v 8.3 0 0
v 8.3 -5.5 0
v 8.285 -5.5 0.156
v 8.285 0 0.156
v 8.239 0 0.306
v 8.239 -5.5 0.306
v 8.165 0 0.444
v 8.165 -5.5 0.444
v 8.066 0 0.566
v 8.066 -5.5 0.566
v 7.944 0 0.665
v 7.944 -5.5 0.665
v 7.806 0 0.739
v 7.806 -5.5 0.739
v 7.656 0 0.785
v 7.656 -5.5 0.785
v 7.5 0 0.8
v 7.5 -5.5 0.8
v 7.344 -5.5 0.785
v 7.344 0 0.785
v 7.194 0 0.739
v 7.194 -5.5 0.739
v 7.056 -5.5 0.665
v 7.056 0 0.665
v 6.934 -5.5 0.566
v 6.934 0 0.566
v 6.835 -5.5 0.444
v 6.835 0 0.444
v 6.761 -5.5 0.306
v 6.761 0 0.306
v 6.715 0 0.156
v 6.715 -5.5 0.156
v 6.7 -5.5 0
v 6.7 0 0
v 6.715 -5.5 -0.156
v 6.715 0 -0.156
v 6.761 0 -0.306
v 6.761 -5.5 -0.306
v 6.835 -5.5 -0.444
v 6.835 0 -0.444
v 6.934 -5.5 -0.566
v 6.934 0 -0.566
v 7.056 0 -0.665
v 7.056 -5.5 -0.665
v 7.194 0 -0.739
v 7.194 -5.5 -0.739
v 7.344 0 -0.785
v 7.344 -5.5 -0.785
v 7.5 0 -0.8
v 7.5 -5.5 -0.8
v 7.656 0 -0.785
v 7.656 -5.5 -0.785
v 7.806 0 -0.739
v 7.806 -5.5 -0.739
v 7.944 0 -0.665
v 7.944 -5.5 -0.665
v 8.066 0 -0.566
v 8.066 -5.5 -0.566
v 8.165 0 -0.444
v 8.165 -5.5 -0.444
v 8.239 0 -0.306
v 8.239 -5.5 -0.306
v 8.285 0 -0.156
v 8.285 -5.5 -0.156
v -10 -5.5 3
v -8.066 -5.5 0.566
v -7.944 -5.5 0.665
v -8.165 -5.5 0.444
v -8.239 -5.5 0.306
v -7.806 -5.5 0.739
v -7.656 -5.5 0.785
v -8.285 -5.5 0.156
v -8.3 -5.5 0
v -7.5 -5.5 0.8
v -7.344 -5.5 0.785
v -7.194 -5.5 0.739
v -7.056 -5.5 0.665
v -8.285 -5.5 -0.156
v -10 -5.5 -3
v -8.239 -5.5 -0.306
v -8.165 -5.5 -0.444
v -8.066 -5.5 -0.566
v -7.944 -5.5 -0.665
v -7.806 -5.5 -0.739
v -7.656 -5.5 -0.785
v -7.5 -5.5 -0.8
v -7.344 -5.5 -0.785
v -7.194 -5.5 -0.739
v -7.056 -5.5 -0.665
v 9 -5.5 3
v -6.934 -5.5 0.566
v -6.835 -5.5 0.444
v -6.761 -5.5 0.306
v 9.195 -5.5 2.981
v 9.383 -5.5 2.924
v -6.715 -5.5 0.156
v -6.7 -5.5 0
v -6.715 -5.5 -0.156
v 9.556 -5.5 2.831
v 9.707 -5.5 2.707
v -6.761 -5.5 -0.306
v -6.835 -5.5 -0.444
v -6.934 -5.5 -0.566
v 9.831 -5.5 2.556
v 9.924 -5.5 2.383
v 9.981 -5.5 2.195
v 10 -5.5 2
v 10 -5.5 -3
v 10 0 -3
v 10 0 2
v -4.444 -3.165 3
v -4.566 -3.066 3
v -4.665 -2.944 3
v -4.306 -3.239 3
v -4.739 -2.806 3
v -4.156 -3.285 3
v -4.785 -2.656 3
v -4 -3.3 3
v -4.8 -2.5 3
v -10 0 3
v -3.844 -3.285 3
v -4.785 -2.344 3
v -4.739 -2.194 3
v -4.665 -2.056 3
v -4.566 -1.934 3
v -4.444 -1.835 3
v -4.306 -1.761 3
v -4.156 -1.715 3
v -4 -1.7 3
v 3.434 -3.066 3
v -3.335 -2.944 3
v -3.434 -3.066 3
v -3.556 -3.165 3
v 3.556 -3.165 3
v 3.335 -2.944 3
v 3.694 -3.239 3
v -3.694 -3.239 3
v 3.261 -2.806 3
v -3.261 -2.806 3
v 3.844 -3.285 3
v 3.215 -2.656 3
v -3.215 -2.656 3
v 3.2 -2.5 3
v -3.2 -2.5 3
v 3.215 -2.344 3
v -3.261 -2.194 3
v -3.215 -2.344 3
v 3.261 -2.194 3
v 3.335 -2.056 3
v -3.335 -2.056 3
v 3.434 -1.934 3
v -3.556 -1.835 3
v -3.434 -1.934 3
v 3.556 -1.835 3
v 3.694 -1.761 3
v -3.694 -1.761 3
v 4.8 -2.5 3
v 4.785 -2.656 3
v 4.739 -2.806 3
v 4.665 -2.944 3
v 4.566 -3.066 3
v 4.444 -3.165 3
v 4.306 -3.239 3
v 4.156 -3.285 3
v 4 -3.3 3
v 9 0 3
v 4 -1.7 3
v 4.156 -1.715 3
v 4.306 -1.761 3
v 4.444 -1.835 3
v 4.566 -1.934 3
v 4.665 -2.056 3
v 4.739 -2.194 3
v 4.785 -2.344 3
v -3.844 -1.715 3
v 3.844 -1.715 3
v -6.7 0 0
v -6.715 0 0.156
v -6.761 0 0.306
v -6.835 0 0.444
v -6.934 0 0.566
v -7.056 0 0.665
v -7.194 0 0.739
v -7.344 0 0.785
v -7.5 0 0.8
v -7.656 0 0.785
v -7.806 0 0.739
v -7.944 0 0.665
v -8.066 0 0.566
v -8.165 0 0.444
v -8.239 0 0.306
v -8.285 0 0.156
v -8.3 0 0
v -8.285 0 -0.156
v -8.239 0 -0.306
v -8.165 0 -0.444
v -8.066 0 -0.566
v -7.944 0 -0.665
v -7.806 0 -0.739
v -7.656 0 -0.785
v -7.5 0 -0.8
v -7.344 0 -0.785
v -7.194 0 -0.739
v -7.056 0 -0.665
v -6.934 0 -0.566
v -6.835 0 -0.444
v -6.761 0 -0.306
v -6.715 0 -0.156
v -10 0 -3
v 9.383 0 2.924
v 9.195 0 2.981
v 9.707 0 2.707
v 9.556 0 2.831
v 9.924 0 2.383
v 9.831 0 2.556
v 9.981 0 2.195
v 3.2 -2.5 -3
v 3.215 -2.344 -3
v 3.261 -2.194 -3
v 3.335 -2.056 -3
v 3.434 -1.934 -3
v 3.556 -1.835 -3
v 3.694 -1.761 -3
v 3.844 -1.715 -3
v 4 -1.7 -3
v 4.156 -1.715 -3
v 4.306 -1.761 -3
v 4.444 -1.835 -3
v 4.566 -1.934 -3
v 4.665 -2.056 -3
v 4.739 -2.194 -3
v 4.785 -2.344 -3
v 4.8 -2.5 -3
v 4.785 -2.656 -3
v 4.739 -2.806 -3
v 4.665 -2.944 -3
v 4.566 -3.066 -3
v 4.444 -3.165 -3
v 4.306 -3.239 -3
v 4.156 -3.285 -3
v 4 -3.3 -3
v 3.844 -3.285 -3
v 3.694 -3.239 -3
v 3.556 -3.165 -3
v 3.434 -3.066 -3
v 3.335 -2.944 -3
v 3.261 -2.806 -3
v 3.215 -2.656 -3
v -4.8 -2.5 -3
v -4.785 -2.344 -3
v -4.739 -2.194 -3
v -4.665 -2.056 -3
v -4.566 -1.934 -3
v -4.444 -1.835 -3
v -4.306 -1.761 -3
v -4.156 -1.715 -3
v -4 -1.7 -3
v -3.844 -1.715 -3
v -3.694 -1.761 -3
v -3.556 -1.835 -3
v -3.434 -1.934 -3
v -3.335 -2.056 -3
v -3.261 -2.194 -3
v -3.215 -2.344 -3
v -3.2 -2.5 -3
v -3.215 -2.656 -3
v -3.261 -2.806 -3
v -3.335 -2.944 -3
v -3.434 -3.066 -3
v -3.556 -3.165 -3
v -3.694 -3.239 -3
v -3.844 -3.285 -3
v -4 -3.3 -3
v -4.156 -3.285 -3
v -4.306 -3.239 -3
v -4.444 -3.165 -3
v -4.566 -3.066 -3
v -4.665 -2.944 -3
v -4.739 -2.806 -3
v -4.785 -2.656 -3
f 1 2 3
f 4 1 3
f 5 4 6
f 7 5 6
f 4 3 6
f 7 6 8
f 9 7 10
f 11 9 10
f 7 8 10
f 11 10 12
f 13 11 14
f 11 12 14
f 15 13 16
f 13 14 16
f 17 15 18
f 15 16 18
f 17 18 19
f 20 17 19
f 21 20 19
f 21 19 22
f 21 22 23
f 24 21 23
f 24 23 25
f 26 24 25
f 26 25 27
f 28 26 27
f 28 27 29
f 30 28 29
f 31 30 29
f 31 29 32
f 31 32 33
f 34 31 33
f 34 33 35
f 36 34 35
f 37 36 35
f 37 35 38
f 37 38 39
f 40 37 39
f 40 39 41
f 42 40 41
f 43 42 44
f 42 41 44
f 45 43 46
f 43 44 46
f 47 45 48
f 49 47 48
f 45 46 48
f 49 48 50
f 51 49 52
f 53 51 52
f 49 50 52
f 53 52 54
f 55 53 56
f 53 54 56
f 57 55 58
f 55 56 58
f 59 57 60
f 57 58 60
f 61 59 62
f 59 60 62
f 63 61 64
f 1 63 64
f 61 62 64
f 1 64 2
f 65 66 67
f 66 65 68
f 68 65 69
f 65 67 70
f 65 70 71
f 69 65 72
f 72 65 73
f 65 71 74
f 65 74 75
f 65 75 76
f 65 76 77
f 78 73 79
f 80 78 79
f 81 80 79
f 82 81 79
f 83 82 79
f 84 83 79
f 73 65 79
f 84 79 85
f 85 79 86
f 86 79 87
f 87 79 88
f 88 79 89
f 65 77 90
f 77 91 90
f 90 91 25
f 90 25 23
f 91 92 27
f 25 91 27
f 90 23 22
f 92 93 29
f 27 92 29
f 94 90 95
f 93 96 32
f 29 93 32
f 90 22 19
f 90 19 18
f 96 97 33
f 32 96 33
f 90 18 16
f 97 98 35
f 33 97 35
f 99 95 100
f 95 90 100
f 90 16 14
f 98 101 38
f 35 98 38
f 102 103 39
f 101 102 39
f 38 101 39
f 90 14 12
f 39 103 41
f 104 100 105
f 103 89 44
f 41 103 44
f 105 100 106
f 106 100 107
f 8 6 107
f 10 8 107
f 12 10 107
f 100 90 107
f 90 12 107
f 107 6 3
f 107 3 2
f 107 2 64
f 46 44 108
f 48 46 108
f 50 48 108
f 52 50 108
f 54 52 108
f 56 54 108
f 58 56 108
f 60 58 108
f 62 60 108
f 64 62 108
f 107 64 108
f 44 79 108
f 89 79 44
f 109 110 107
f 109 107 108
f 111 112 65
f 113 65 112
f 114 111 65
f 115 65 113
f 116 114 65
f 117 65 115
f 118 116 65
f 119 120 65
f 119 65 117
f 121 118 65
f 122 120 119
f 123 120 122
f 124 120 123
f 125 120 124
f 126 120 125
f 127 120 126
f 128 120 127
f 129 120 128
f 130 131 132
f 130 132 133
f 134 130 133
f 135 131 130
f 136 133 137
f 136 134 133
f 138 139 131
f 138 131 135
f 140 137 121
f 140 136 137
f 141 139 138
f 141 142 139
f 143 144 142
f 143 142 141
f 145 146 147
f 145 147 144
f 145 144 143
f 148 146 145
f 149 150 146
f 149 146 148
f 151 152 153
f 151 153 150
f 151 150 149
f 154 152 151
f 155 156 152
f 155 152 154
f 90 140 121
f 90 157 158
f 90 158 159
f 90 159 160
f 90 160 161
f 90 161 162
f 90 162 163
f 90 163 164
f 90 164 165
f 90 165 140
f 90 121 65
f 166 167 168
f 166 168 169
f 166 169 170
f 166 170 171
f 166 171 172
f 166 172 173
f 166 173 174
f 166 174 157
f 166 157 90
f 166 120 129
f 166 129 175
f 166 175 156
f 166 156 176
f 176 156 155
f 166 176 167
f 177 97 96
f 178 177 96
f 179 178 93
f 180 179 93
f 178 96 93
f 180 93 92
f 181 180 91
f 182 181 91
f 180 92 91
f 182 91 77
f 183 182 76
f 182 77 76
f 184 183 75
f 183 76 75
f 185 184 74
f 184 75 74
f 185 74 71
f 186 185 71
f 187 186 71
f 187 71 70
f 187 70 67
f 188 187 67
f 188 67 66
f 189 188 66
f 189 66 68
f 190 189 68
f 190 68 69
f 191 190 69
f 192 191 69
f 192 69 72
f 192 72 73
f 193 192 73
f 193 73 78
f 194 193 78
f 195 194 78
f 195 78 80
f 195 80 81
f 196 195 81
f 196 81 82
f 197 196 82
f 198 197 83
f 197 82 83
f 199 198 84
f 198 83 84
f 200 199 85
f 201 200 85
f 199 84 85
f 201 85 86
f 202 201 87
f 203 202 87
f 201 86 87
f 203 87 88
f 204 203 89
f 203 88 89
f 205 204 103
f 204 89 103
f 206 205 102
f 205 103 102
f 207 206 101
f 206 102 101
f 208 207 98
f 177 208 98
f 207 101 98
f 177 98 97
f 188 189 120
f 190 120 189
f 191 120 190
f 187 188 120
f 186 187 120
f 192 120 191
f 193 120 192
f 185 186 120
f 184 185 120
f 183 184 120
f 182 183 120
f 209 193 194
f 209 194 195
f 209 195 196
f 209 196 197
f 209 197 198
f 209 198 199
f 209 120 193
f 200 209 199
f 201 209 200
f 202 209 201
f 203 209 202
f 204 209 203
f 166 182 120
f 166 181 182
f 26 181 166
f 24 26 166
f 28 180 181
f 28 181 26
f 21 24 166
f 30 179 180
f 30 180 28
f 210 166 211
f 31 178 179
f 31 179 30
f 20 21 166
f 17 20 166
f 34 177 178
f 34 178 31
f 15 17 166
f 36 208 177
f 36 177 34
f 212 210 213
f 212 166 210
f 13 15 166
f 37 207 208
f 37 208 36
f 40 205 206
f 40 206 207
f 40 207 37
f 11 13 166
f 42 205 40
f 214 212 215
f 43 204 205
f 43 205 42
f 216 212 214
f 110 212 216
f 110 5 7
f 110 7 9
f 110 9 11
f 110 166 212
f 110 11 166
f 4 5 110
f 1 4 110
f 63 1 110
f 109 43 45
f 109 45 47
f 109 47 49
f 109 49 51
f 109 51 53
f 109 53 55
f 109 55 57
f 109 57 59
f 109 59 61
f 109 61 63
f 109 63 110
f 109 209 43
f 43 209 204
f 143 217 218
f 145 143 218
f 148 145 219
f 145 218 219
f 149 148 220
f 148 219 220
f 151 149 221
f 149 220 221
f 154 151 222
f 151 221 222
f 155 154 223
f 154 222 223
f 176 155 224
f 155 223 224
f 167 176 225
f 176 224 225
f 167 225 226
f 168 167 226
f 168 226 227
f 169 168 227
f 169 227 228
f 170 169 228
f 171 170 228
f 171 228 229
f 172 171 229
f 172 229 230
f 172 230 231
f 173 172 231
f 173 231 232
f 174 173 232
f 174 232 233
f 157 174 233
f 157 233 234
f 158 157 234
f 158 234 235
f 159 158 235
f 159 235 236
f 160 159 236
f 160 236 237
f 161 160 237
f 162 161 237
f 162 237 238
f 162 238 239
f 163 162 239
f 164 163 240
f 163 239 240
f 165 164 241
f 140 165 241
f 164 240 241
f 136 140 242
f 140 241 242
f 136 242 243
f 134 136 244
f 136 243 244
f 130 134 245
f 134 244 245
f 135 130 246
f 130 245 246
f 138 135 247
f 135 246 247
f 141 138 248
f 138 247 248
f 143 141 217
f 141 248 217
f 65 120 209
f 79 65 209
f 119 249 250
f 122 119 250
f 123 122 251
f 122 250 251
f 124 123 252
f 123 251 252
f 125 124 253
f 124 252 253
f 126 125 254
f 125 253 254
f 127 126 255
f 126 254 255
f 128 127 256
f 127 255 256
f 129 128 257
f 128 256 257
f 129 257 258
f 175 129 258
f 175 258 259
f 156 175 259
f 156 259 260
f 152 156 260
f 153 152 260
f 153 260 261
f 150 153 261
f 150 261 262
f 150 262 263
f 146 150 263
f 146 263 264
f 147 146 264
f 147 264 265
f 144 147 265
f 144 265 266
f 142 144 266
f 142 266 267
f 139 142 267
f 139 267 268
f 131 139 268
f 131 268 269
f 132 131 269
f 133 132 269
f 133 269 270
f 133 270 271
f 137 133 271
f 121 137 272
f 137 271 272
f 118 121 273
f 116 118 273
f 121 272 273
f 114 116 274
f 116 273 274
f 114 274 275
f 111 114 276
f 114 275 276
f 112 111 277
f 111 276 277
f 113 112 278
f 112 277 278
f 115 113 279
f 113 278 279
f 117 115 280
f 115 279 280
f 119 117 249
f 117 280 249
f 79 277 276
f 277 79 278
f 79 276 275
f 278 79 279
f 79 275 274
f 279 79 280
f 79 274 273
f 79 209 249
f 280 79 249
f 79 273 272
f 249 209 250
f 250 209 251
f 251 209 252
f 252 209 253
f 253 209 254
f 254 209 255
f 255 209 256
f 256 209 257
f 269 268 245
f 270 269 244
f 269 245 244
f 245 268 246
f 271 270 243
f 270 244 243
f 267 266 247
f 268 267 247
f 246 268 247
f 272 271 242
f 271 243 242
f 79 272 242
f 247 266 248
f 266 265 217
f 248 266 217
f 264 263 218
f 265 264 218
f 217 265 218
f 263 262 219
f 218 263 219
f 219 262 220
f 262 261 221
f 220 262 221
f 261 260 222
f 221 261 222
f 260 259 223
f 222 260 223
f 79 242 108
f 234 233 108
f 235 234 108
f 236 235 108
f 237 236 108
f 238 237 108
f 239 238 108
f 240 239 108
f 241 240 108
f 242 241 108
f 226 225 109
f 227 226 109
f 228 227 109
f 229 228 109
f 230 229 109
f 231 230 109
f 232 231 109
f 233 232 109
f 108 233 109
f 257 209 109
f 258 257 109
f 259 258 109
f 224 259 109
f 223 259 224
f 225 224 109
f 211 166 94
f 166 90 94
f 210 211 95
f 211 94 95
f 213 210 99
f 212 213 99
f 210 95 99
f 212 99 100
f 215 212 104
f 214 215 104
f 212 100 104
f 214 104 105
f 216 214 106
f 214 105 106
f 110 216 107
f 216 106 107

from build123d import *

# Parameters (mm, degrees)
SKETCH1_W             = 20
SKETCH1_H             = 6
BOSS_EXTRUDE1_DEPTH   = 5.5
M2X0_4_TAPPED_HOLE2_D = 1.6
FILLET1_R             = 1
M2X0_4_TAPPED_HOLE1_D = 1.6


with BuildPart() as part:
    # Sketch1 → Boss-Extrude1 (new body)
    with BuildSketch(Plane(origin=(0, 0, 0), x_dir=(1, 0, 0), z_dir=(0, 1, 0))):
        Rectangle(SKETCH1_W, SKETCH1_H)
    extrude(amount=-BOSS_EXTRUDE1_DEPTH)

    # M2x0.4 Tapped Hole2 (through all)
    with Locations(Plane(origin=(0, 0, 0), x_dir=(-1, 0, 0), z_dir=(0, 1, 0))):
        with Locations((7.5, 0), (-7.5, 0)):
            Hole(M2X0_4_TAPPED_HOLE2_D / 2)

    # Fillet1
    fillet1_edges = [part.edges().sort_by_distance(p)[0] for p in [
        (10, -2.75, 3),
    ]]
    fillet(fillet1_edges, radius=FILLET1_R)

    # M2x0.4 Tapped Hole1 (through all)
    with Locations(Plane.XY.offset(3)):
        with Locations((-4, -2.5), (4, -2.5)):
            Hole(M2X0_4_TAPPED_HOLE1_D / 2)


solid = part.part
